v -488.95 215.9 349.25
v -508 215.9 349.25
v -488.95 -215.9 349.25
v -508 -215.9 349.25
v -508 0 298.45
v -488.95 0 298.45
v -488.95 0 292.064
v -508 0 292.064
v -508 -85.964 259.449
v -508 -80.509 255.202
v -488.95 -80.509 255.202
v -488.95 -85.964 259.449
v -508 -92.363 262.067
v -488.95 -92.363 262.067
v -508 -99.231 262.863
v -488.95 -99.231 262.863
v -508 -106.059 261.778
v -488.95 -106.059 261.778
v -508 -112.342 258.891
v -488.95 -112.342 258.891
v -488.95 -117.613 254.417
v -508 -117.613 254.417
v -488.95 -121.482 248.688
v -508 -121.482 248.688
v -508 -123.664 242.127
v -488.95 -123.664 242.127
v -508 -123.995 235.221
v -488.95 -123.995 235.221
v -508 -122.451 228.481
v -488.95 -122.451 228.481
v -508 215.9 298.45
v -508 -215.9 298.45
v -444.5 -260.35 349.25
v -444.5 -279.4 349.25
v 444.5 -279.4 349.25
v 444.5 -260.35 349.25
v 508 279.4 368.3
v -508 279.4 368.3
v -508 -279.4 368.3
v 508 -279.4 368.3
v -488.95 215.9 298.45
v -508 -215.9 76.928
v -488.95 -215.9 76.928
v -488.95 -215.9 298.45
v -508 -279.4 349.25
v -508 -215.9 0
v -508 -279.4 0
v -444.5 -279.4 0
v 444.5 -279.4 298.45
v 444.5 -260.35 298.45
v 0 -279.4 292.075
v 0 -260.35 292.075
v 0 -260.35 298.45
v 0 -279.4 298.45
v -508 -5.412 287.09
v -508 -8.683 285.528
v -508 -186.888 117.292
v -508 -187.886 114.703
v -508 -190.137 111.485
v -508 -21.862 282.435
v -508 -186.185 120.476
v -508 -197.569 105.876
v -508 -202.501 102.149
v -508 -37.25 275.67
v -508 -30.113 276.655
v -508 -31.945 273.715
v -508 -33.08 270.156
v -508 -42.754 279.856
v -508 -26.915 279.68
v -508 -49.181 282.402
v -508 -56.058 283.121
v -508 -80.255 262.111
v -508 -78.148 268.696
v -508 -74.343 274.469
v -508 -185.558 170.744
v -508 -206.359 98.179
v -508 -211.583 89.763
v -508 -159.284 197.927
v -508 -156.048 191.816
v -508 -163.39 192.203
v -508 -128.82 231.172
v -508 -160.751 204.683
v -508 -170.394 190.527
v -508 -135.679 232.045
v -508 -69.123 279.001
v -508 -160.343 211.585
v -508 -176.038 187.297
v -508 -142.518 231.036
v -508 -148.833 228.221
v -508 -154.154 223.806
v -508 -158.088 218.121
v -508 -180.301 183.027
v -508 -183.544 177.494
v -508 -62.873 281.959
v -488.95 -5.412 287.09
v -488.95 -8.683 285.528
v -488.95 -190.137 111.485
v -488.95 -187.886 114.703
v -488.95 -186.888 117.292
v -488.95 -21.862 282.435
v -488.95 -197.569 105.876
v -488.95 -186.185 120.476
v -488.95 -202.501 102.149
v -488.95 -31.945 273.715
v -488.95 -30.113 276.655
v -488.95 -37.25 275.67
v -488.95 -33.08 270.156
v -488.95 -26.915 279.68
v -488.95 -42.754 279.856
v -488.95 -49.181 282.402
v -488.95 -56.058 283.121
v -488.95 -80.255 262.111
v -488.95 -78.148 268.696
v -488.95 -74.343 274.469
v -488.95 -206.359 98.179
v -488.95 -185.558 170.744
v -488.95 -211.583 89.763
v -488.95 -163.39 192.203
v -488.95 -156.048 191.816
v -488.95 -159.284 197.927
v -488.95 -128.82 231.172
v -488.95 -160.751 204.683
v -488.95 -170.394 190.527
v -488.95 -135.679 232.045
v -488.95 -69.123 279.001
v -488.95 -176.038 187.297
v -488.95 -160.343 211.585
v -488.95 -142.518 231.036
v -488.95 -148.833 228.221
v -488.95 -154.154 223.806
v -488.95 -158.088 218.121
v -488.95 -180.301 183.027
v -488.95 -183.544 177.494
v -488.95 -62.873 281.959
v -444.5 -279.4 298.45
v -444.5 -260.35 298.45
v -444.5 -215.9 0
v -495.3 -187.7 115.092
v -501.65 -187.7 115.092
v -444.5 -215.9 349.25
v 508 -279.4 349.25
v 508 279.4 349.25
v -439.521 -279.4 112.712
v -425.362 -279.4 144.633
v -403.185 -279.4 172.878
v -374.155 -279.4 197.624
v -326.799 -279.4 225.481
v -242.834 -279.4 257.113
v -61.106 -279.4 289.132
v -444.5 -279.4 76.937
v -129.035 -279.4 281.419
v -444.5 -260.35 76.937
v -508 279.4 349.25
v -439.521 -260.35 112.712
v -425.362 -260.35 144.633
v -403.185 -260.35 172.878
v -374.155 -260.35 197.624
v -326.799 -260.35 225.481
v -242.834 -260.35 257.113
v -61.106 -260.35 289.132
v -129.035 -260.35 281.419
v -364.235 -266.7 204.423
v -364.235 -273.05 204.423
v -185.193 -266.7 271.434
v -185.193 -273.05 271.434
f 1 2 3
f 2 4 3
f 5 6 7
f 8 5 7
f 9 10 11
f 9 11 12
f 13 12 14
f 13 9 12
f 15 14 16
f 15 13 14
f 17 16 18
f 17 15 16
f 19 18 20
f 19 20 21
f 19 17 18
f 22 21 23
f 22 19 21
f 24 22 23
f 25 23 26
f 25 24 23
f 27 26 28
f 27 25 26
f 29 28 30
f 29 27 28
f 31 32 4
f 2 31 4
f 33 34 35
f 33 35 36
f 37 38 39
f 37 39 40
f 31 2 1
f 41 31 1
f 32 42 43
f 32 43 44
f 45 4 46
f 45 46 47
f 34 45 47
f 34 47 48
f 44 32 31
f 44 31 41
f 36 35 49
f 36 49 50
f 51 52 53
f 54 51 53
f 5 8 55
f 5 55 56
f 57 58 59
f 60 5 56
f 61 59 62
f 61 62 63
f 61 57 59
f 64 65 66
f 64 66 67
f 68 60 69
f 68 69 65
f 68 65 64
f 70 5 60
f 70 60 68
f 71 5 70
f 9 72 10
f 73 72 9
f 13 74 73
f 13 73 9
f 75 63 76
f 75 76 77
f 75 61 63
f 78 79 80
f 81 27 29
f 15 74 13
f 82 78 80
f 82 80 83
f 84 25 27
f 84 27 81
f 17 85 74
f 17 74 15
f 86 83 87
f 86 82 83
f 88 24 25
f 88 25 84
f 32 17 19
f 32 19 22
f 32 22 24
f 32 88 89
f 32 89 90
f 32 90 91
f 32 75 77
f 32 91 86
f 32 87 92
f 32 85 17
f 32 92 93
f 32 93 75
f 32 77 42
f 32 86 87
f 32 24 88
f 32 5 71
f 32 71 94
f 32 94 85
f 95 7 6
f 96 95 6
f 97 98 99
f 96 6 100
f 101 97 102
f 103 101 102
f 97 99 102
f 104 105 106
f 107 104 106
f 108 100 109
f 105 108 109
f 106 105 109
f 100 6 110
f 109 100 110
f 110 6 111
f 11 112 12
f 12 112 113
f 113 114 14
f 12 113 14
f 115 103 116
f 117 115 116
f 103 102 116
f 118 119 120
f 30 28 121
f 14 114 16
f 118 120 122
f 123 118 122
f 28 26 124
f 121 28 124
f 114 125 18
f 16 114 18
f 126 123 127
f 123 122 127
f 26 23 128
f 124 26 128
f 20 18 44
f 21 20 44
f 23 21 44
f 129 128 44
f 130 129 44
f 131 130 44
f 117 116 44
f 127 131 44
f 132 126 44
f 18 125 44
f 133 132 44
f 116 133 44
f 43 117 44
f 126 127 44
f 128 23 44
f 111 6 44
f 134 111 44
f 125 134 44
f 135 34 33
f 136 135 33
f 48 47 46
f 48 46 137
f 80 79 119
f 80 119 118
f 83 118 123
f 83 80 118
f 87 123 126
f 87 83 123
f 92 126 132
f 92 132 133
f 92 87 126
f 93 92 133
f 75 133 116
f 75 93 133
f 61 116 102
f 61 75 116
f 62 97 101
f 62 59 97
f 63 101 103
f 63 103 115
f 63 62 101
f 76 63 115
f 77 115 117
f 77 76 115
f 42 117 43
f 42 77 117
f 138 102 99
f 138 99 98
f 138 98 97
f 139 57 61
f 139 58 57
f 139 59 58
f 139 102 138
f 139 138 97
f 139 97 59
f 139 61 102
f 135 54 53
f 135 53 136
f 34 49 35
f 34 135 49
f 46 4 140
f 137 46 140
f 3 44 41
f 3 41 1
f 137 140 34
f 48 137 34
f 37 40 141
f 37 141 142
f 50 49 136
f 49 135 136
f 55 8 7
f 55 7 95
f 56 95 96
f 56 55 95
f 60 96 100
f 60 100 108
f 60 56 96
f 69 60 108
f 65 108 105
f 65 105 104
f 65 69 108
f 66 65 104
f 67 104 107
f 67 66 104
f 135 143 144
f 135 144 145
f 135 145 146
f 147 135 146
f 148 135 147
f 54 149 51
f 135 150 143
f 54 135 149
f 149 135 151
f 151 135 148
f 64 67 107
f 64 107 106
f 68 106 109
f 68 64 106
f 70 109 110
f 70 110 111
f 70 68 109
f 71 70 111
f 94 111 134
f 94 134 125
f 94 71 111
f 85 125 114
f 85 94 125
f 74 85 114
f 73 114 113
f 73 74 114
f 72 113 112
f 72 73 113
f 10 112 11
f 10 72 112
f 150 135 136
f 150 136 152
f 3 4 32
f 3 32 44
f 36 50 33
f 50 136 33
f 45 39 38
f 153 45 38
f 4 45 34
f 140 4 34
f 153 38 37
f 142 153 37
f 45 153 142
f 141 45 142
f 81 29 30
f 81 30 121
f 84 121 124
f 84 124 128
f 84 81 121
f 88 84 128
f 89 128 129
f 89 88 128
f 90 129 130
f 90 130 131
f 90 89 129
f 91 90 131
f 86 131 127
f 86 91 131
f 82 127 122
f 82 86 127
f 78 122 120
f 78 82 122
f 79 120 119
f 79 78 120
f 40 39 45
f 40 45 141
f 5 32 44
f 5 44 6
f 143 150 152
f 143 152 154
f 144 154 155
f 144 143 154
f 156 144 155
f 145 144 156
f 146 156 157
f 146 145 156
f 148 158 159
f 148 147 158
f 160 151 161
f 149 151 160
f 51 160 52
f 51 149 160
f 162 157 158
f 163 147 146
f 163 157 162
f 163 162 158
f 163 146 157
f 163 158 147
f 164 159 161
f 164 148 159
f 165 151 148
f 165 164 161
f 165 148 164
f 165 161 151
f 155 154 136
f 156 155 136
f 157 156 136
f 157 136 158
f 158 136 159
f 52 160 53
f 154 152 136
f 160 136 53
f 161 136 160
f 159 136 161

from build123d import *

# Parameters (mm, degrees)
F1_W      = 1016
F1_H      = 558.8
F2_DEPTH  = 19.05
F3_W      = 63.5
F3_H      = 63.5
F4_DEPTH  = 349.25
F5_W      = 19.05
F5_H      = 50.8
F6_DEPTH  = 444.5
F8_W      = 19.05
F8_H      = 50.8
F9_DEPTH  = 215.9
F12_DEPTH = 19.05
F14_DEPTH = 19.05


with BuildPart() as f2:
    # F1 (on offset) → F2 (new body)
    with BuildSketch(Plane.XY.offset(368.3)):
        Rectangle(F1_W, F1_H)
    extrude(amount=-F2_DEPTH)


with BuildPart() as f4:
    # F3 (on face) → F4 (new body, through all)
    with BuildSketch(Plane(origin=(0, 0, 349.25), x_dir=(1, 0, 0), z_dir=(0, 0, -1))):
        with Locations((-476.25, 247.65)):
            Rectangle(F3_W, F3_H)
    extrude(amount=F4_DEPTH)


with BuildPart() as f6:
    # F5 (on Right) → F6 (new body, through all)
    with BuildSketch(Plane.YZ):
        with Locations((-269.875, 323.85)):
            Rectangle(F5_W, F5_H)
    extrude(amount=-F6_DEPTH)

    # F7: F6 across face


with BuildPart() as f6_1:
    add(f6.part)
    add(f6.part.mirror(Plane(origin=(0, -269.875, 323.85), x_dir=(0, 1, 0), z_dir=(1, 0, 0))))


with BuildPart() as f9:
    # F8 (on Front) → F9 (new body, through all)
    with BuildSketch(Plane.XZ):
        with Locations((-498.475, 323.85)):
            Rectangle(F8_W, F8_H)
    extrude(amount=F9_DEPTH)

    # F10: F9 across face


with BuildPart() as f9_1:
    add(f9.part)
    add(f9.part.mirror(Plane(origin=(-498.475, 0, 323.85), x_dir=(1, 0, 0), z_dir=(0, 1, 0))))


with BuildPart() as f12:
    # F11 (on face) → F12 (new body)
    with BuildSketch(Plane(origin=(-508, 0, 0), x_dir=(0, -1, 0), z_dir=(-1, 0, 0))):
        with BuildLine():
            ThreePointArc((33.0799778456, 270.1558769488), (62.8732727069, 281.9585449249), (80.5087788616, 255.2016334305))
            ThreePointArc((80.5087788616, 255.2016334305), (112.3416470737, 258.8910631212), (122.4510396453, 228.4814664142))
            ThreePointArc((122.4510396453, 228.4814664142), (154.1541238457, 223.8062292832), (156.0484644371, 191.8163111249))
            add(Edge.make_bspline(
                [(156.0484644371, 191.8163111249), (167.7488357967, 194.0958318488), (196.3995793658, 180.5637728836), (174.725267388, 100.2722267968), (208.613150374, 107.6504246008), (215.9, 76.9283920527)],
                knots=[0, 0, 0, 0, 0.2801682219, 0.661986872, 1, 1, 1, 1], degree=3))
            Line((215.9, 76.9283920527), (215.9, 298.45))
            Line((215.9, 298.45), (0, 298.45))
            Line((0, 298.45), (0, 292.0640114744))
            add(Edge.make_bspline(
                [(0, 292.0640114744), (6.454422463, 284.7026517546), (12.9921563713, 286.1066684098), (31.2538918898, 279.8478218411), (33.0799778456, 270.1558769488)],
                knots=[0, 0, 0, 0, 0.4609722548, 1, 1, 1, 1], degree=3))
        make_face()
    extrude(amount=-F12_DEPTH)


with BuildPart() as f14:
    # F13 (on face) → F14 (new body)
    with BuildSketch(Plane.XZ.offset(279.4)):
        with BuildLine():
            Line((-444.5, 298.45), (-444.5, 76.9366))
            add(Edge.make_bspline(
                [(-444.5, 76.9366), (-444.5, 239.3636506188), (-157.3917120695, 289.9159283825), (0, 292.0746)],
                knots=[0, 0, 0, 0, 493.8264969035, 493.8264969035, 493.8264969035, 493.8264969035], degree=3))
            Line((0, 292.0746), (0, 298.45))
            Line((0, 298.45), (-444.5, 298.45))
        make_face()
    extrude(amount=-F14_DEPTH)


solid = Compound([f2.part, f4.part, f6_1.part, f9_1.part, f12.part, f14.part])
